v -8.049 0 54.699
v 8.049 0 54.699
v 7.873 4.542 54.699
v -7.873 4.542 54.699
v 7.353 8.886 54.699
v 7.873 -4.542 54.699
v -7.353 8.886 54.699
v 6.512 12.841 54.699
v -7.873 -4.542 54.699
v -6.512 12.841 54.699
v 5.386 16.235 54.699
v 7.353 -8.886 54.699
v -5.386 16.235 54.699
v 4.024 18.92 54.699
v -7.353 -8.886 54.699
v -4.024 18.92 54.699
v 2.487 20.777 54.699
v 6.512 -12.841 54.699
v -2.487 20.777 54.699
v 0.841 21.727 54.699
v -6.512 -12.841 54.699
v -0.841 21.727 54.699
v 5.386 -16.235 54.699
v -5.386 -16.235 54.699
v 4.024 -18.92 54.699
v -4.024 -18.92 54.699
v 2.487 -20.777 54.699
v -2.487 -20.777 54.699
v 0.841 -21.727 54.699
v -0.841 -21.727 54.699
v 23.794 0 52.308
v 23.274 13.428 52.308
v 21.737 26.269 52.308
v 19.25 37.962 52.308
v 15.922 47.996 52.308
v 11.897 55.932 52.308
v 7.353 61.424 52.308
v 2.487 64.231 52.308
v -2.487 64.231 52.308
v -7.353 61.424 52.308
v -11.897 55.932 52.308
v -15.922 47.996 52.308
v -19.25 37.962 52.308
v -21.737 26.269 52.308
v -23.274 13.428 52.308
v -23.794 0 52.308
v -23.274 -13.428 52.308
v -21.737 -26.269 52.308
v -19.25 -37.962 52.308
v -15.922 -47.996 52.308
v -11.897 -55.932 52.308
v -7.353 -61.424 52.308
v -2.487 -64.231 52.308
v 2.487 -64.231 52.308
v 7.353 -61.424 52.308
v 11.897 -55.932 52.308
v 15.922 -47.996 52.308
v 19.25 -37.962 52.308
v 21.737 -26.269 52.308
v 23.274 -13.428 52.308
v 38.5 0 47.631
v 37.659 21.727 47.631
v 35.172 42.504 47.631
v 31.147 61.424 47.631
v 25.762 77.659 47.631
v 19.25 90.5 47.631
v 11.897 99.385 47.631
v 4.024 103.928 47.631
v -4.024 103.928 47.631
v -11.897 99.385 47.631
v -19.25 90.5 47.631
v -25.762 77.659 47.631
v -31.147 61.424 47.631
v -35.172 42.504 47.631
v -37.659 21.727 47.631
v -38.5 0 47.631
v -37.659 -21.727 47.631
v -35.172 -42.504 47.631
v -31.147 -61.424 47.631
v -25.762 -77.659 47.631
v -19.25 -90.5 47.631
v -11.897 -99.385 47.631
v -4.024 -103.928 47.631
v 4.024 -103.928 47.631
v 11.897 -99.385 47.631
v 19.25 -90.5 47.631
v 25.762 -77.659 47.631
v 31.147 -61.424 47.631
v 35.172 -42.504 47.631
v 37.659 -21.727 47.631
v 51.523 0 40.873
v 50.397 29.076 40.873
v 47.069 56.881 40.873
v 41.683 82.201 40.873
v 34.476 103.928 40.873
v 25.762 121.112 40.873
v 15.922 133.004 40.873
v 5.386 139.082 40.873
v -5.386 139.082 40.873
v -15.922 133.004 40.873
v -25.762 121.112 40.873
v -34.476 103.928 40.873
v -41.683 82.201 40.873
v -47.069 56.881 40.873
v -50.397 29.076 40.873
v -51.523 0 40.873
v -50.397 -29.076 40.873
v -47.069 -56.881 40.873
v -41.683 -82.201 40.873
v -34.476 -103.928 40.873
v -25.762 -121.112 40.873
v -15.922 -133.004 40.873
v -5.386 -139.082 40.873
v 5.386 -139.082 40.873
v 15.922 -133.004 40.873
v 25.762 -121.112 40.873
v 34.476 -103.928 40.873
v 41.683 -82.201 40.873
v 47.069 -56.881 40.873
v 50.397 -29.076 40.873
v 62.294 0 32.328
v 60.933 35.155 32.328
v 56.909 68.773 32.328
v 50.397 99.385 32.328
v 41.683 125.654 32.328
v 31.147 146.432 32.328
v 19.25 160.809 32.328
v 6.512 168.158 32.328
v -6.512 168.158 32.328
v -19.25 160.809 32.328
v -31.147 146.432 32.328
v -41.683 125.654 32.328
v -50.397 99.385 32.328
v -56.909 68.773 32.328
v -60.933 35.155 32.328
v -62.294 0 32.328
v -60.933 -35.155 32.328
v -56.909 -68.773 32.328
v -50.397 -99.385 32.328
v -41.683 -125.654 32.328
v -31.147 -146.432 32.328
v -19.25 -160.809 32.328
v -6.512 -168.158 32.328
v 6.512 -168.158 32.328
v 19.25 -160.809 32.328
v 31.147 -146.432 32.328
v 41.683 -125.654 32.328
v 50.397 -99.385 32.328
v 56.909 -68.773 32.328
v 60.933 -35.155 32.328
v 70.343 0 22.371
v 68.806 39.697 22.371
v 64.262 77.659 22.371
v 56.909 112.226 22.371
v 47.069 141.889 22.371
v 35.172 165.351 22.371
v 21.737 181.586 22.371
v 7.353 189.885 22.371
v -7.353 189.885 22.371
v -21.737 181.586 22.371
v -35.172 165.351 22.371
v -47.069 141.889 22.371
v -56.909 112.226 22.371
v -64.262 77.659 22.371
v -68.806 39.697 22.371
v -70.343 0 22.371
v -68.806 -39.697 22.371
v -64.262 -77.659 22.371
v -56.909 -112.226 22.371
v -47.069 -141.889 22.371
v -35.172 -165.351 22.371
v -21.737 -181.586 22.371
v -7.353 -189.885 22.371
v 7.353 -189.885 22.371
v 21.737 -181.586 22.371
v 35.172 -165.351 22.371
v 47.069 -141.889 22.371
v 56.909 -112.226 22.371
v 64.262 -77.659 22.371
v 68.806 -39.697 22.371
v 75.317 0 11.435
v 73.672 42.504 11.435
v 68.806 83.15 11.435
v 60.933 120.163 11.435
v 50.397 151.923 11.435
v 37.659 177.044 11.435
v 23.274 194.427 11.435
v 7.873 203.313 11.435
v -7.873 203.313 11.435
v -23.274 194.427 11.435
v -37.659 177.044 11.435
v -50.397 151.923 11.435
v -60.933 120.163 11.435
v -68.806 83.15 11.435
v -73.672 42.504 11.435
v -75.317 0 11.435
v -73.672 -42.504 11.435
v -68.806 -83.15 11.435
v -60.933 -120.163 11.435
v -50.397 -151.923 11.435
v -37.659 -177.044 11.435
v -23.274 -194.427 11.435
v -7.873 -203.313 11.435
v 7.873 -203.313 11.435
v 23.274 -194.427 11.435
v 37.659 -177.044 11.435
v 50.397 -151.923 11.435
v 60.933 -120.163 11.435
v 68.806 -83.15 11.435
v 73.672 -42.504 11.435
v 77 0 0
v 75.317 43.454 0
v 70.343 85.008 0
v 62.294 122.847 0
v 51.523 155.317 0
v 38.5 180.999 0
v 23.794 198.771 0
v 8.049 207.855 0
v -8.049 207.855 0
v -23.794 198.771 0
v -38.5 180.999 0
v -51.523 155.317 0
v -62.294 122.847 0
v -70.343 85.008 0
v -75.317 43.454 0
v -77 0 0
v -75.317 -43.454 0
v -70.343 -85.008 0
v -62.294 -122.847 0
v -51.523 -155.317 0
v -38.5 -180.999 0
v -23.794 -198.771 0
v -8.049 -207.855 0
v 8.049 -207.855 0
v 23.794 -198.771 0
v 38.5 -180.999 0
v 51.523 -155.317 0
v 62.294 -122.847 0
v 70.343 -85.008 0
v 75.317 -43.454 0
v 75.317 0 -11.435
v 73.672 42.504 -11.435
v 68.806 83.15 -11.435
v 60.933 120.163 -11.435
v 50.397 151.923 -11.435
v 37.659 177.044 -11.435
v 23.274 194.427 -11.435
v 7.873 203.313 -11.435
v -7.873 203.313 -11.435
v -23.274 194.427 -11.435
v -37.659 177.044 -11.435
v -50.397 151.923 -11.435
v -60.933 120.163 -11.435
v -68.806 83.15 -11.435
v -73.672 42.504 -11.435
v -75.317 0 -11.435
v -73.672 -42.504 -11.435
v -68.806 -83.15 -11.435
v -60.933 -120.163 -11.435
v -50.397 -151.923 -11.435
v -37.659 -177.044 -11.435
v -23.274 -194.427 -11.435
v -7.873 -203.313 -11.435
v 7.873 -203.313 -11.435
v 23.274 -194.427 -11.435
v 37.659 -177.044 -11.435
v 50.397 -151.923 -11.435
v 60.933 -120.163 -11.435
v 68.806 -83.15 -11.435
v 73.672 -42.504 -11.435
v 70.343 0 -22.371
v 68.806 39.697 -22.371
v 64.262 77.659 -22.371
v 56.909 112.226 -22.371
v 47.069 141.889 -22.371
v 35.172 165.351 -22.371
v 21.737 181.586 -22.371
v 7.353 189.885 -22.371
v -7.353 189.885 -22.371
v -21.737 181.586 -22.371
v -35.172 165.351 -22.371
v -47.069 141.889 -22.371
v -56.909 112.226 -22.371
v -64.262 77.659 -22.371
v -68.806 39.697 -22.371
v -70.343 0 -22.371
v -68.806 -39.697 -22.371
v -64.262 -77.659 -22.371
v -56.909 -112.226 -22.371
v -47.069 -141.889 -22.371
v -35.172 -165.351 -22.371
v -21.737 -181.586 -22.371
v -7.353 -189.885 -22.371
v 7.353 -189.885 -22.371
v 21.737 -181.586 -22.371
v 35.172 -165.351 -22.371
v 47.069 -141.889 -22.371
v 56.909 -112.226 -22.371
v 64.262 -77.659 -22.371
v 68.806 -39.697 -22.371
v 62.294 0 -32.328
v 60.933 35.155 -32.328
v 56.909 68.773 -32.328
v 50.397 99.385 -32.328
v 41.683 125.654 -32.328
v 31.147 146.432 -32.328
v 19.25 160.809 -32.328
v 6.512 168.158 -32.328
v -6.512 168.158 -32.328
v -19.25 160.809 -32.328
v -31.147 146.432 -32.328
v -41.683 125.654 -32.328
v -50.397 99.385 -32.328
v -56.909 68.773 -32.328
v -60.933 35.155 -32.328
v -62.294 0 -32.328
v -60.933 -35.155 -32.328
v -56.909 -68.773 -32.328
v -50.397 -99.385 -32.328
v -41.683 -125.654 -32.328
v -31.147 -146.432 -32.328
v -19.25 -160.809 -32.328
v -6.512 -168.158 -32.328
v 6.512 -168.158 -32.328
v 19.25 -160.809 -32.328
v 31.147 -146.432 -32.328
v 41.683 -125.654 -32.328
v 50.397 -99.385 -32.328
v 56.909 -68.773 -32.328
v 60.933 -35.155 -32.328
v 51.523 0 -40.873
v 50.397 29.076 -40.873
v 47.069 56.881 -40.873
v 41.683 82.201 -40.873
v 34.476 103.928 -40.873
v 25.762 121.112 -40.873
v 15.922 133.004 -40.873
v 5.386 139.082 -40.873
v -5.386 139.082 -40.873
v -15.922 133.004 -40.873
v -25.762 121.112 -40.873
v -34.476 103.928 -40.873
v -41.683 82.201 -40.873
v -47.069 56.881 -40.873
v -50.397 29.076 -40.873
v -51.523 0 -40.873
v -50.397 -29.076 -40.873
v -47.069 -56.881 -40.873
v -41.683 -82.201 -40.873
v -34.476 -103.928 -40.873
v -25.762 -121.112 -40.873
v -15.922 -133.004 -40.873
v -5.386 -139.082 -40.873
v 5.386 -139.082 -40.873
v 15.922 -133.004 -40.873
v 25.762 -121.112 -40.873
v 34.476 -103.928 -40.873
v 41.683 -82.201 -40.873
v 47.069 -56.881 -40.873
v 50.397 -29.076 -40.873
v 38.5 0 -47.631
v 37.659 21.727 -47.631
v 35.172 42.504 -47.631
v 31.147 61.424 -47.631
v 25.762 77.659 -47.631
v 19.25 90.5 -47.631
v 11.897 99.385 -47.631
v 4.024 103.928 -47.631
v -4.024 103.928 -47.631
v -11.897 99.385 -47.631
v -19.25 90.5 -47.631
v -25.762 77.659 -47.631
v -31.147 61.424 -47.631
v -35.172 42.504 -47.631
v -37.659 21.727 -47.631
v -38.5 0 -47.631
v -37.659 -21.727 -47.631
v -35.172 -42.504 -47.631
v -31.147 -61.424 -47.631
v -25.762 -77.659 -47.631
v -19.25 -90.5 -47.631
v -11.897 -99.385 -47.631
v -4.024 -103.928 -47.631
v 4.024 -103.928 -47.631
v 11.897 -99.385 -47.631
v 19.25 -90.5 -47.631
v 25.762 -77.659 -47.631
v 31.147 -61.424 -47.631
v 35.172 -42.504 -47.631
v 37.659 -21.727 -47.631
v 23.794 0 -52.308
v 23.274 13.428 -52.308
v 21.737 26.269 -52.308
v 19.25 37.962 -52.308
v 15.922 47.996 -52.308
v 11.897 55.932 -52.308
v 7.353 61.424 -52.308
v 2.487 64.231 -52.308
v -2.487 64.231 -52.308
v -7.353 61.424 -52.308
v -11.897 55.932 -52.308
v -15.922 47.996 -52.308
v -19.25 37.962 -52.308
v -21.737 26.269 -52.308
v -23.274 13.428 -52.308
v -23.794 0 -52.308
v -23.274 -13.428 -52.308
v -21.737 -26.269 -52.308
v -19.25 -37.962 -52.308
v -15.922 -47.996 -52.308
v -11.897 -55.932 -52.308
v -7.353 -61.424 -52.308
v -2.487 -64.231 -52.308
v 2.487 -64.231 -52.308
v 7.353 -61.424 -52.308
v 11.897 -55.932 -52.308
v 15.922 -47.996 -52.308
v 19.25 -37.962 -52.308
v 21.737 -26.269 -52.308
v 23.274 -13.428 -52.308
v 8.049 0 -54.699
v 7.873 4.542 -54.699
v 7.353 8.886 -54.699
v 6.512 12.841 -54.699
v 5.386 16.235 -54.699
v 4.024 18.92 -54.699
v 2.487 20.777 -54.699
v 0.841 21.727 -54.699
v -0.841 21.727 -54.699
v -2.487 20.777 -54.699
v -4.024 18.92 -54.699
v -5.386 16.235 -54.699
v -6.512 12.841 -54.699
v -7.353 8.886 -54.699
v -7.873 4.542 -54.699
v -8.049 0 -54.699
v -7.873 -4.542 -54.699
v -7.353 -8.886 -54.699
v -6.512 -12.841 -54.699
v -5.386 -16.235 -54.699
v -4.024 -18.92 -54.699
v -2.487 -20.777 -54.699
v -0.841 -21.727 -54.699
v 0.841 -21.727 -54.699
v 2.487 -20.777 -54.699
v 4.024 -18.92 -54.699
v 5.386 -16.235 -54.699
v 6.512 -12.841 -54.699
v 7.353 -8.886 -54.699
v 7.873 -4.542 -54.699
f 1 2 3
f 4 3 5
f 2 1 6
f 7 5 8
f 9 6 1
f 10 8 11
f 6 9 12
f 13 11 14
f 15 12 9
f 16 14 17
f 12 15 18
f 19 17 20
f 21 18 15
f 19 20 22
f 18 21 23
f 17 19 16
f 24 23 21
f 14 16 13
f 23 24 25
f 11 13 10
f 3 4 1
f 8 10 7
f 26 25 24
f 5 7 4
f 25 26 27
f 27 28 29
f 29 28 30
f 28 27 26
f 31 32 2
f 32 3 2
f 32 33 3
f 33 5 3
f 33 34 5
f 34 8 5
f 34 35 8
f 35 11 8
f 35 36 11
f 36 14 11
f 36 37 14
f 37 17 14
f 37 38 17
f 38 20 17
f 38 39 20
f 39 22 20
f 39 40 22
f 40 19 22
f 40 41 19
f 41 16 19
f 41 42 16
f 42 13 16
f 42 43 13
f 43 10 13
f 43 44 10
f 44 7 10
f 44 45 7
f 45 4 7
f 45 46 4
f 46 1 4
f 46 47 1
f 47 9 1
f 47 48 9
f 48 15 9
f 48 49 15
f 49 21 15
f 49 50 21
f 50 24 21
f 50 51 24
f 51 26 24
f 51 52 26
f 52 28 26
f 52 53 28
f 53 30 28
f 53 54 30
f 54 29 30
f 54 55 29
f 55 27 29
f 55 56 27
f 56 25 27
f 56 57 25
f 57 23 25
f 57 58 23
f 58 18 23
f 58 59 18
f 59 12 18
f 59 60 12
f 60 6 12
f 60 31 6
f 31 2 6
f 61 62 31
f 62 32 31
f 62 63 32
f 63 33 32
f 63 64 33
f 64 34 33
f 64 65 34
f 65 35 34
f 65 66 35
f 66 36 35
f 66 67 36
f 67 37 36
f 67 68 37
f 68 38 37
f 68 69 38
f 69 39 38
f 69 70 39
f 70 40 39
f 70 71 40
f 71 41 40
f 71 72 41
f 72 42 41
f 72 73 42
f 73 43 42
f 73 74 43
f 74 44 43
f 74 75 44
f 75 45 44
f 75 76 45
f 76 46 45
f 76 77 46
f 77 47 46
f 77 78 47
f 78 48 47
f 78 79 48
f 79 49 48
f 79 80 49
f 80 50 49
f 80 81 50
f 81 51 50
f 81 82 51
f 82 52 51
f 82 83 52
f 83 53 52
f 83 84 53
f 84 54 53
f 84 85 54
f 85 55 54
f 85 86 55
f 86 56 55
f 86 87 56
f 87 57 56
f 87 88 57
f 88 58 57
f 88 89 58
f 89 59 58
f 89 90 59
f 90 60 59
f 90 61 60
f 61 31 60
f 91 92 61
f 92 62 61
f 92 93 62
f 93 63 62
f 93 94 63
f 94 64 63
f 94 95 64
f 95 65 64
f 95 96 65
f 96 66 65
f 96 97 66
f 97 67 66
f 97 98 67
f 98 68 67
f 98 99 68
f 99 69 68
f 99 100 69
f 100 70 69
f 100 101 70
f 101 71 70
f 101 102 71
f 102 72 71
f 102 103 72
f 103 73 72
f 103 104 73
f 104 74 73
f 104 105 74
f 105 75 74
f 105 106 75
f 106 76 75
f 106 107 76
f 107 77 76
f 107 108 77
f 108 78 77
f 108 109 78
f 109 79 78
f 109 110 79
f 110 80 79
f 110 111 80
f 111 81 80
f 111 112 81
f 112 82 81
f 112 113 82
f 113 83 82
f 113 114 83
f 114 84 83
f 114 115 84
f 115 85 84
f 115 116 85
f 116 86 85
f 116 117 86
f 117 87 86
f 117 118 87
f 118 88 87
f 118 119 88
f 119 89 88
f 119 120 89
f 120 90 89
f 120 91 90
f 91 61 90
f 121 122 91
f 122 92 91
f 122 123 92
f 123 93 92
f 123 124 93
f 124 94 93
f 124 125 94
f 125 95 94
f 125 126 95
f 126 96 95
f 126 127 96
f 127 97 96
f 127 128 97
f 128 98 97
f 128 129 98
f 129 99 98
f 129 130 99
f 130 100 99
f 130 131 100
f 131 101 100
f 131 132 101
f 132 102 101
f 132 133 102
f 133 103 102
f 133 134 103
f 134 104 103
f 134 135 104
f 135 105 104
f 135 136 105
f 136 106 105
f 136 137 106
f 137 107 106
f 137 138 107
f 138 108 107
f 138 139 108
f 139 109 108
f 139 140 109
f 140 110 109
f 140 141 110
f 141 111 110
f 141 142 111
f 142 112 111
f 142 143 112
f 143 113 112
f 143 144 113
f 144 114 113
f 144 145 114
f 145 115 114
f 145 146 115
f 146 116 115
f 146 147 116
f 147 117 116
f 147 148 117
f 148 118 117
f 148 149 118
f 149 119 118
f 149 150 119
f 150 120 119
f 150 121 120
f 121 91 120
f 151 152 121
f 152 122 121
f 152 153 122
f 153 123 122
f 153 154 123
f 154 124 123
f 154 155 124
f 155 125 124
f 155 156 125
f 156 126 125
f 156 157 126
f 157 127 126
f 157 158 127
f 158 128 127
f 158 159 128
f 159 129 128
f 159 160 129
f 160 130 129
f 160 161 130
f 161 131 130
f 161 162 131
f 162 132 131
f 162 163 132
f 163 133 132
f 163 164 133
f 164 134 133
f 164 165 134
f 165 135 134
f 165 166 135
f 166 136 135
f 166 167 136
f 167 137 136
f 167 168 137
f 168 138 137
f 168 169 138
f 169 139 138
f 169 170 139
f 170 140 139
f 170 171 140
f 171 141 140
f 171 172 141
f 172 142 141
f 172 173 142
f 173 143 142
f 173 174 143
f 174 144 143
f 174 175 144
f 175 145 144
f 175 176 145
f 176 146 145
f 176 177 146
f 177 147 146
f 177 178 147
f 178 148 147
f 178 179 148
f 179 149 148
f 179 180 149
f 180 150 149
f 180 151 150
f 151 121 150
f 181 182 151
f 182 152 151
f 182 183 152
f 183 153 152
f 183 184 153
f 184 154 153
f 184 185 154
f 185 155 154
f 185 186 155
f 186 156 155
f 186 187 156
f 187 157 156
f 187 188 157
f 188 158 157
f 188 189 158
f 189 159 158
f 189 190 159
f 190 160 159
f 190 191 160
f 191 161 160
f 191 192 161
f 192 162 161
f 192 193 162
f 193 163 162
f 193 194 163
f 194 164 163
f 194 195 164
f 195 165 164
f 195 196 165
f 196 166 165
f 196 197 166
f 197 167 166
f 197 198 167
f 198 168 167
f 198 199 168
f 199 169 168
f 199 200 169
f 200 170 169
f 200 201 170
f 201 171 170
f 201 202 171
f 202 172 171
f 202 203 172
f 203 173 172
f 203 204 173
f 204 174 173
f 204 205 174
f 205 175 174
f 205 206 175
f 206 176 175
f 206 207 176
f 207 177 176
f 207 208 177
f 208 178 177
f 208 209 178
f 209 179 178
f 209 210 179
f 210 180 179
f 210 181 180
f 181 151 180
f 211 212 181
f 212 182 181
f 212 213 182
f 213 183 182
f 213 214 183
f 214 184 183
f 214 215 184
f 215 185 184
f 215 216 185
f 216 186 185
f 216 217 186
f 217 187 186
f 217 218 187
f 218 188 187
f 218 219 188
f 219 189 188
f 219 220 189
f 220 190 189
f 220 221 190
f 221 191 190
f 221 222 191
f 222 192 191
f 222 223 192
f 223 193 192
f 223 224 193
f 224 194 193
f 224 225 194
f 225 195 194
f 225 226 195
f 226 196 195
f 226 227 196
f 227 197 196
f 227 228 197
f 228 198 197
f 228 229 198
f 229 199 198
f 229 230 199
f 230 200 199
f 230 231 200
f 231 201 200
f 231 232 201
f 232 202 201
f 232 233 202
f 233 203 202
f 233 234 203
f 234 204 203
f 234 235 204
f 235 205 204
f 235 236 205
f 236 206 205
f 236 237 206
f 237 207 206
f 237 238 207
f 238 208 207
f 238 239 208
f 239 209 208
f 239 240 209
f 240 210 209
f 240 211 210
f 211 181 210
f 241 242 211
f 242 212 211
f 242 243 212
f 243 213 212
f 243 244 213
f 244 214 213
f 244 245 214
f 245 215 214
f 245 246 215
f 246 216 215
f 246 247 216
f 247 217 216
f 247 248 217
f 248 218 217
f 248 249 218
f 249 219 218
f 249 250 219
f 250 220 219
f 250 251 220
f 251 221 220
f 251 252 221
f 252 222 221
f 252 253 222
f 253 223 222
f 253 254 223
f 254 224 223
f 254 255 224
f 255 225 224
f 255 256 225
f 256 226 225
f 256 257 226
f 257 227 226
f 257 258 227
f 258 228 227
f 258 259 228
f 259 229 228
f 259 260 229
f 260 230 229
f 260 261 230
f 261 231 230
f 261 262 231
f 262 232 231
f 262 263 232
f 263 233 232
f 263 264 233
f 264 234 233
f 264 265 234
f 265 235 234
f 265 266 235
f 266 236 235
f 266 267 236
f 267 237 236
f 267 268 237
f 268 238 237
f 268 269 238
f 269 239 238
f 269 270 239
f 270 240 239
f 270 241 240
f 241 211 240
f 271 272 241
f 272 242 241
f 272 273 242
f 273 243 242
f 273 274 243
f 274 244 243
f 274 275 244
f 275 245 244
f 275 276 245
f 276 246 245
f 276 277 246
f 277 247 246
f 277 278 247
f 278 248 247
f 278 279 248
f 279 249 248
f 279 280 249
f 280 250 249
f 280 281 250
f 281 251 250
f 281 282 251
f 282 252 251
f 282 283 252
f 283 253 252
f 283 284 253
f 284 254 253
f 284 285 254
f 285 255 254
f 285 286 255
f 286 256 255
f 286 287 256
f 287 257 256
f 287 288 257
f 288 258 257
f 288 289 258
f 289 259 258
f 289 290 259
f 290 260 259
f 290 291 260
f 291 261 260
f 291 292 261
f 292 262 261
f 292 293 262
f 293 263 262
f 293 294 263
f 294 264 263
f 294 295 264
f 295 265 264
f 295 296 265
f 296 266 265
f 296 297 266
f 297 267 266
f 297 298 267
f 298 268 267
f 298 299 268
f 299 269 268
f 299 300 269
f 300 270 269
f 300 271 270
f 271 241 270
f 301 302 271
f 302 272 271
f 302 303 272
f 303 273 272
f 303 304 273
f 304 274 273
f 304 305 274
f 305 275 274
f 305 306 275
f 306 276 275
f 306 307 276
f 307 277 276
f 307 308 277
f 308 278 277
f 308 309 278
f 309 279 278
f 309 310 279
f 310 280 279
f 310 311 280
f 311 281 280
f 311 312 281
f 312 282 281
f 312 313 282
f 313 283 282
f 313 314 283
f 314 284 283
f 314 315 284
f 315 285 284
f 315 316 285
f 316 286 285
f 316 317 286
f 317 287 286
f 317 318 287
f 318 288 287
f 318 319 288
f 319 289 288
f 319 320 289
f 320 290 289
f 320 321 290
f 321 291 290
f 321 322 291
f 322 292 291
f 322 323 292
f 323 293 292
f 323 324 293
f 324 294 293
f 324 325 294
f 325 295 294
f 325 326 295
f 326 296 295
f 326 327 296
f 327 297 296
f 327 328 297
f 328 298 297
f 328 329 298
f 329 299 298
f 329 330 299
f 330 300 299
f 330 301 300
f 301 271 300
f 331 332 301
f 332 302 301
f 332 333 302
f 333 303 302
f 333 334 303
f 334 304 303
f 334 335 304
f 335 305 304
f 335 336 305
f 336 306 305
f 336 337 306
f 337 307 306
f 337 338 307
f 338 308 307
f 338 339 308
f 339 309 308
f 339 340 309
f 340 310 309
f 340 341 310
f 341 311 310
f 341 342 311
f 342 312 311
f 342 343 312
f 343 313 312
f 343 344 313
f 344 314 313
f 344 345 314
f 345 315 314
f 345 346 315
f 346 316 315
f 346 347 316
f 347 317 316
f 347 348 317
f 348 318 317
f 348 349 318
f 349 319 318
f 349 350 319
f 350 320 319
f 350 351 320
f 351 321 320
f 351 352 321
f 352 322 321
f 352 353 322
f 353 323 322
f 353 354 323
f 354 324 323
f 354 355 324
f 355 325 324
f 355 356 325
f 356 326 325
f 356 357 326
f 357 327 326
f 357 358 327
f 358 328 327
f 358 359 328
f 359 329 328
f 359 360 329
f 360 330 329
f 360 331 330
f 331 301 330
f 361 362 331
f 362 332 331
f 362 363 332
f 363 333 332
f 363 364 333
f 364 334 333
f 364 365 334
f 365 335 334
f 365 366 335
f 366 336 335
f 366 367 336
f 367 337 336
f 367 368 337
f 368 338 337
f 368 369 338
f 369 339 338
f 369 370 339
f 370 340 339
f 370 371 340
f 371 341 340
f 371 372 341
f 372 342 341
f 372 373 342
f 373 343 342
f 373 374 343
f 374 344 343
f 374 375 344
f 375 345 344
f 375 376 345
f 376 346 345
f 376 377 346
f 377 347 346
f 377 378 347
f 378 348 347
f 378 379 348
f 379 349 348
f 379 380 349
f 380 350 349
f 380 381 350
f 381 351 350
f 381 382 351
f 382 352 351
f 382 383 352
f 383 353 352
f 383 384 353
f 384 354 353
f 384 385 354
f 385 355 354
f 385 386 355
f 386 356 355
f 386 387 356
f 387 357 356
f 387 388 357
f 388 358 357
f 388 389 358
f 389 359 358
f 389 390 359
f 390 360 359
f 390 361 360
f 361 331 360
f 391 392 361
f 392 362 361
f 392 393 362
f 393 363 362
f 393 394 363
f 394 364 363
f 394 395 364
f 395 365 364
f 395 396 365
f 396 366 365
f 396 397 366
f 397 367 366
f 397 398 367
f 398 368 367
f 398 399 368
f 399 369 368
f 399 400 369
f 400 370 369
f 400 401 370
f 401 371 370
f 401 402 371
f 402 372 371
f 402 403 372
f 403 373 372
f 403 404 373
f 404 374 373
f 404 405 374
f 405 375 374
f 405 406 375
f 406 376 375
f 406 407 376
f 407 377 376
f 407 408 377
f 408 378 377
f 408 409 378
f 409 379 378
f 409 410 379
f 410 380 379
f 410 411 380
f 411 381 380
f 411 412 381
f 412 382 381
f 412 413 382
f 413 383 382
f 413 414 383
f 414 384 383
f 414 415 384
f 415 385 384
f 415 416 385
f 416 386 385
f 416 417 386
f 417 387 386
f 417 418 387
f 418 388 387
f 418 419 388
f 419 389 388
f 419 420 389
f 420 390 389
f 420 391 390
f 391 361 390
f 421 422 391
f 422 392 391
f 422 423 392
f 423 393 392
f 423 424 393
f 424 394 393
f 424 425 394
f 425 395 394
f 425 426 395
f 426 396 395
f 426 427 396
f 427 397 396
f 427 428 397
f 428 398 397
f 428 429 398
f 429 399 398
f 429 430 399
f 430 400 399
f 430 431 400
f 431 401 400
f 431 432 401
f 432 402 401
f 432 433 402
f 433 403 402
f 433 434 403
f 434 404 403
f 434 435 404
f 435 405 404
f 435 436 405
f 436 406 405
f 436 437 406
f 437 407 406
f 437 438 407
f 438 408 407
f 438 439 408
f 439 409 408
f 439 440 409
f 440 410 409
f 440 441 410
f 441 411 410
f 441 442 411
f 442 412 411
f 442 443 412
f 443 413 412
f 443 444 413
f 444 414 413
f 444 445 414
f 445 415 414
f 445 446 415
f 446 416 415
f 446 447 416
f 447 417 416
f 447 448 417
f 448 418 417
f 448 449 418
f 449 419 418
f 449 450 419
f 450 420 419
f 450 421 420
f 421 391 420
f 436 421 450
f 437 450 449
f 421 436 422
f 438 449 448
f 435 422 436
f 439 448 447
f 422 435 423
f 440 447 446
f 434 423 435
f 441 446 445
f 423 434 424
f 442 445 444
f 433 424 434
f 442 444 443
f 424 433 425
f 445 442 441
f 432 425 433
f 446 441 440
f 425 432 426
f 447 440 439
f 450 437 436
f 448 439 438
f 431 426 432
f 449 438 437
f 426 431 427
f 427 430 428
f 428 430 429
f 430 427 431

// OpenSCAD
// Generated by SolidPython 1.0.1 on 2020-07-29 00:46:48


scale(v = [7, 19, 5]) {
	sphere(r = 11);
}
/***********************************************
*********      SolidPython code:      **********
************************************************
 
# import packages: SolidPython
from solid import *
from solid.utils import *
from itertools import chain, combinations, permutations


class Resize:

    def __init__(self, scad_file):
        self.scad_file = scad_file
        #self.scad_file = import_scad(scad_file)
        # cone/cylinder param:
        self.r1 = 0
        self.r2 = 0
        self.h = 0
        # rectangular prism param:
        self.w = 0
        self.l = 0
        # ellipse param:
        self.r = 0

    # import OpenScad code (file name corresponds to shape)


    # classify shape + parameters
    def assign(self, param1, param2, param3):
        if self.scad_file == 'cone.scad':
            self.r1 = param1
            self.r2 = param2
            self.h = param3
        elif self.scad_file == 'cylinder.scad':
            self.r1 = param1
            self.r2 = param2
            self.h = param3
        elif self.scad_file == 'rectangularPrism.scad':
            self.h = param1
            self.l = param2
            self.w = param3
        else:
            self.r = param1
            self.h = param2

    # resize parameters
    def iterate(self):
        x = range(3, 20, 2)
        i = 1
        if self.scad_file == 'cone.scad':
            tempList = list(permutations(x, 2))
            for temp in tempList:
                param1 = temp[0]
                param2 = temp[1]
                filepath = 'produced_scad_files/' + 'cone' + str(param1) + '_' + str(param2) + '_' + '.scad'
                scad_render_to_file(cylinder(h=param1, r1=param2, r2=0), filepath)

        elif self.scad_file == 'cylinder.scad':
            tempList = list(permutations(x, 3))
            for temp in tempList:
                param1 = temp[0]
                param2 = temp[1]
                filepath = 'produced_scad_files/' + 'cylinder' + str(param1) + '_' + str(param2) + '_' + '.scad'
                scad_render_to_file(cylinder(h=param1, r1=param2, r2=param2), filepath)

        elif self.scad_file == 'rectangularPrism.scad':
            tempList = list(permutations(x, 3))
            for temp in tempList:
                param1 = temp[0]
                param2 = temp[1]
                param3 = temp[2]
                filepath = 'produced_scad_files/' + 'rectangularPrism' + str(param1) + '_' + str(param2) + '_' + str(
                    param3) + '.scad'
                scad_render_to_file(cube(size=(param1, param2, param3)), filepath)

        elif self.scad_file == 'ellipse.scad':
            tempList = list(permutations(x, 4))
            for temp in tempList:
                param1 = temp[0]
                param2 = temp[1]
                param3 = temp[2]
                param4 = temp[3]
                filepath = 'produced_scad_files/' + 'ellipse' + str(param1) + '_' + str(param2) + '_' + str(param3) + '_' + str(param4) + '.scad'
                scad_render_to_file(scale([param1, param2, param3])(sphere(r=param4)), filepath)

    def render_to_scadfile(self):
        scad_render_to_file(scad, 'example.scad') 
 
************************************************/
